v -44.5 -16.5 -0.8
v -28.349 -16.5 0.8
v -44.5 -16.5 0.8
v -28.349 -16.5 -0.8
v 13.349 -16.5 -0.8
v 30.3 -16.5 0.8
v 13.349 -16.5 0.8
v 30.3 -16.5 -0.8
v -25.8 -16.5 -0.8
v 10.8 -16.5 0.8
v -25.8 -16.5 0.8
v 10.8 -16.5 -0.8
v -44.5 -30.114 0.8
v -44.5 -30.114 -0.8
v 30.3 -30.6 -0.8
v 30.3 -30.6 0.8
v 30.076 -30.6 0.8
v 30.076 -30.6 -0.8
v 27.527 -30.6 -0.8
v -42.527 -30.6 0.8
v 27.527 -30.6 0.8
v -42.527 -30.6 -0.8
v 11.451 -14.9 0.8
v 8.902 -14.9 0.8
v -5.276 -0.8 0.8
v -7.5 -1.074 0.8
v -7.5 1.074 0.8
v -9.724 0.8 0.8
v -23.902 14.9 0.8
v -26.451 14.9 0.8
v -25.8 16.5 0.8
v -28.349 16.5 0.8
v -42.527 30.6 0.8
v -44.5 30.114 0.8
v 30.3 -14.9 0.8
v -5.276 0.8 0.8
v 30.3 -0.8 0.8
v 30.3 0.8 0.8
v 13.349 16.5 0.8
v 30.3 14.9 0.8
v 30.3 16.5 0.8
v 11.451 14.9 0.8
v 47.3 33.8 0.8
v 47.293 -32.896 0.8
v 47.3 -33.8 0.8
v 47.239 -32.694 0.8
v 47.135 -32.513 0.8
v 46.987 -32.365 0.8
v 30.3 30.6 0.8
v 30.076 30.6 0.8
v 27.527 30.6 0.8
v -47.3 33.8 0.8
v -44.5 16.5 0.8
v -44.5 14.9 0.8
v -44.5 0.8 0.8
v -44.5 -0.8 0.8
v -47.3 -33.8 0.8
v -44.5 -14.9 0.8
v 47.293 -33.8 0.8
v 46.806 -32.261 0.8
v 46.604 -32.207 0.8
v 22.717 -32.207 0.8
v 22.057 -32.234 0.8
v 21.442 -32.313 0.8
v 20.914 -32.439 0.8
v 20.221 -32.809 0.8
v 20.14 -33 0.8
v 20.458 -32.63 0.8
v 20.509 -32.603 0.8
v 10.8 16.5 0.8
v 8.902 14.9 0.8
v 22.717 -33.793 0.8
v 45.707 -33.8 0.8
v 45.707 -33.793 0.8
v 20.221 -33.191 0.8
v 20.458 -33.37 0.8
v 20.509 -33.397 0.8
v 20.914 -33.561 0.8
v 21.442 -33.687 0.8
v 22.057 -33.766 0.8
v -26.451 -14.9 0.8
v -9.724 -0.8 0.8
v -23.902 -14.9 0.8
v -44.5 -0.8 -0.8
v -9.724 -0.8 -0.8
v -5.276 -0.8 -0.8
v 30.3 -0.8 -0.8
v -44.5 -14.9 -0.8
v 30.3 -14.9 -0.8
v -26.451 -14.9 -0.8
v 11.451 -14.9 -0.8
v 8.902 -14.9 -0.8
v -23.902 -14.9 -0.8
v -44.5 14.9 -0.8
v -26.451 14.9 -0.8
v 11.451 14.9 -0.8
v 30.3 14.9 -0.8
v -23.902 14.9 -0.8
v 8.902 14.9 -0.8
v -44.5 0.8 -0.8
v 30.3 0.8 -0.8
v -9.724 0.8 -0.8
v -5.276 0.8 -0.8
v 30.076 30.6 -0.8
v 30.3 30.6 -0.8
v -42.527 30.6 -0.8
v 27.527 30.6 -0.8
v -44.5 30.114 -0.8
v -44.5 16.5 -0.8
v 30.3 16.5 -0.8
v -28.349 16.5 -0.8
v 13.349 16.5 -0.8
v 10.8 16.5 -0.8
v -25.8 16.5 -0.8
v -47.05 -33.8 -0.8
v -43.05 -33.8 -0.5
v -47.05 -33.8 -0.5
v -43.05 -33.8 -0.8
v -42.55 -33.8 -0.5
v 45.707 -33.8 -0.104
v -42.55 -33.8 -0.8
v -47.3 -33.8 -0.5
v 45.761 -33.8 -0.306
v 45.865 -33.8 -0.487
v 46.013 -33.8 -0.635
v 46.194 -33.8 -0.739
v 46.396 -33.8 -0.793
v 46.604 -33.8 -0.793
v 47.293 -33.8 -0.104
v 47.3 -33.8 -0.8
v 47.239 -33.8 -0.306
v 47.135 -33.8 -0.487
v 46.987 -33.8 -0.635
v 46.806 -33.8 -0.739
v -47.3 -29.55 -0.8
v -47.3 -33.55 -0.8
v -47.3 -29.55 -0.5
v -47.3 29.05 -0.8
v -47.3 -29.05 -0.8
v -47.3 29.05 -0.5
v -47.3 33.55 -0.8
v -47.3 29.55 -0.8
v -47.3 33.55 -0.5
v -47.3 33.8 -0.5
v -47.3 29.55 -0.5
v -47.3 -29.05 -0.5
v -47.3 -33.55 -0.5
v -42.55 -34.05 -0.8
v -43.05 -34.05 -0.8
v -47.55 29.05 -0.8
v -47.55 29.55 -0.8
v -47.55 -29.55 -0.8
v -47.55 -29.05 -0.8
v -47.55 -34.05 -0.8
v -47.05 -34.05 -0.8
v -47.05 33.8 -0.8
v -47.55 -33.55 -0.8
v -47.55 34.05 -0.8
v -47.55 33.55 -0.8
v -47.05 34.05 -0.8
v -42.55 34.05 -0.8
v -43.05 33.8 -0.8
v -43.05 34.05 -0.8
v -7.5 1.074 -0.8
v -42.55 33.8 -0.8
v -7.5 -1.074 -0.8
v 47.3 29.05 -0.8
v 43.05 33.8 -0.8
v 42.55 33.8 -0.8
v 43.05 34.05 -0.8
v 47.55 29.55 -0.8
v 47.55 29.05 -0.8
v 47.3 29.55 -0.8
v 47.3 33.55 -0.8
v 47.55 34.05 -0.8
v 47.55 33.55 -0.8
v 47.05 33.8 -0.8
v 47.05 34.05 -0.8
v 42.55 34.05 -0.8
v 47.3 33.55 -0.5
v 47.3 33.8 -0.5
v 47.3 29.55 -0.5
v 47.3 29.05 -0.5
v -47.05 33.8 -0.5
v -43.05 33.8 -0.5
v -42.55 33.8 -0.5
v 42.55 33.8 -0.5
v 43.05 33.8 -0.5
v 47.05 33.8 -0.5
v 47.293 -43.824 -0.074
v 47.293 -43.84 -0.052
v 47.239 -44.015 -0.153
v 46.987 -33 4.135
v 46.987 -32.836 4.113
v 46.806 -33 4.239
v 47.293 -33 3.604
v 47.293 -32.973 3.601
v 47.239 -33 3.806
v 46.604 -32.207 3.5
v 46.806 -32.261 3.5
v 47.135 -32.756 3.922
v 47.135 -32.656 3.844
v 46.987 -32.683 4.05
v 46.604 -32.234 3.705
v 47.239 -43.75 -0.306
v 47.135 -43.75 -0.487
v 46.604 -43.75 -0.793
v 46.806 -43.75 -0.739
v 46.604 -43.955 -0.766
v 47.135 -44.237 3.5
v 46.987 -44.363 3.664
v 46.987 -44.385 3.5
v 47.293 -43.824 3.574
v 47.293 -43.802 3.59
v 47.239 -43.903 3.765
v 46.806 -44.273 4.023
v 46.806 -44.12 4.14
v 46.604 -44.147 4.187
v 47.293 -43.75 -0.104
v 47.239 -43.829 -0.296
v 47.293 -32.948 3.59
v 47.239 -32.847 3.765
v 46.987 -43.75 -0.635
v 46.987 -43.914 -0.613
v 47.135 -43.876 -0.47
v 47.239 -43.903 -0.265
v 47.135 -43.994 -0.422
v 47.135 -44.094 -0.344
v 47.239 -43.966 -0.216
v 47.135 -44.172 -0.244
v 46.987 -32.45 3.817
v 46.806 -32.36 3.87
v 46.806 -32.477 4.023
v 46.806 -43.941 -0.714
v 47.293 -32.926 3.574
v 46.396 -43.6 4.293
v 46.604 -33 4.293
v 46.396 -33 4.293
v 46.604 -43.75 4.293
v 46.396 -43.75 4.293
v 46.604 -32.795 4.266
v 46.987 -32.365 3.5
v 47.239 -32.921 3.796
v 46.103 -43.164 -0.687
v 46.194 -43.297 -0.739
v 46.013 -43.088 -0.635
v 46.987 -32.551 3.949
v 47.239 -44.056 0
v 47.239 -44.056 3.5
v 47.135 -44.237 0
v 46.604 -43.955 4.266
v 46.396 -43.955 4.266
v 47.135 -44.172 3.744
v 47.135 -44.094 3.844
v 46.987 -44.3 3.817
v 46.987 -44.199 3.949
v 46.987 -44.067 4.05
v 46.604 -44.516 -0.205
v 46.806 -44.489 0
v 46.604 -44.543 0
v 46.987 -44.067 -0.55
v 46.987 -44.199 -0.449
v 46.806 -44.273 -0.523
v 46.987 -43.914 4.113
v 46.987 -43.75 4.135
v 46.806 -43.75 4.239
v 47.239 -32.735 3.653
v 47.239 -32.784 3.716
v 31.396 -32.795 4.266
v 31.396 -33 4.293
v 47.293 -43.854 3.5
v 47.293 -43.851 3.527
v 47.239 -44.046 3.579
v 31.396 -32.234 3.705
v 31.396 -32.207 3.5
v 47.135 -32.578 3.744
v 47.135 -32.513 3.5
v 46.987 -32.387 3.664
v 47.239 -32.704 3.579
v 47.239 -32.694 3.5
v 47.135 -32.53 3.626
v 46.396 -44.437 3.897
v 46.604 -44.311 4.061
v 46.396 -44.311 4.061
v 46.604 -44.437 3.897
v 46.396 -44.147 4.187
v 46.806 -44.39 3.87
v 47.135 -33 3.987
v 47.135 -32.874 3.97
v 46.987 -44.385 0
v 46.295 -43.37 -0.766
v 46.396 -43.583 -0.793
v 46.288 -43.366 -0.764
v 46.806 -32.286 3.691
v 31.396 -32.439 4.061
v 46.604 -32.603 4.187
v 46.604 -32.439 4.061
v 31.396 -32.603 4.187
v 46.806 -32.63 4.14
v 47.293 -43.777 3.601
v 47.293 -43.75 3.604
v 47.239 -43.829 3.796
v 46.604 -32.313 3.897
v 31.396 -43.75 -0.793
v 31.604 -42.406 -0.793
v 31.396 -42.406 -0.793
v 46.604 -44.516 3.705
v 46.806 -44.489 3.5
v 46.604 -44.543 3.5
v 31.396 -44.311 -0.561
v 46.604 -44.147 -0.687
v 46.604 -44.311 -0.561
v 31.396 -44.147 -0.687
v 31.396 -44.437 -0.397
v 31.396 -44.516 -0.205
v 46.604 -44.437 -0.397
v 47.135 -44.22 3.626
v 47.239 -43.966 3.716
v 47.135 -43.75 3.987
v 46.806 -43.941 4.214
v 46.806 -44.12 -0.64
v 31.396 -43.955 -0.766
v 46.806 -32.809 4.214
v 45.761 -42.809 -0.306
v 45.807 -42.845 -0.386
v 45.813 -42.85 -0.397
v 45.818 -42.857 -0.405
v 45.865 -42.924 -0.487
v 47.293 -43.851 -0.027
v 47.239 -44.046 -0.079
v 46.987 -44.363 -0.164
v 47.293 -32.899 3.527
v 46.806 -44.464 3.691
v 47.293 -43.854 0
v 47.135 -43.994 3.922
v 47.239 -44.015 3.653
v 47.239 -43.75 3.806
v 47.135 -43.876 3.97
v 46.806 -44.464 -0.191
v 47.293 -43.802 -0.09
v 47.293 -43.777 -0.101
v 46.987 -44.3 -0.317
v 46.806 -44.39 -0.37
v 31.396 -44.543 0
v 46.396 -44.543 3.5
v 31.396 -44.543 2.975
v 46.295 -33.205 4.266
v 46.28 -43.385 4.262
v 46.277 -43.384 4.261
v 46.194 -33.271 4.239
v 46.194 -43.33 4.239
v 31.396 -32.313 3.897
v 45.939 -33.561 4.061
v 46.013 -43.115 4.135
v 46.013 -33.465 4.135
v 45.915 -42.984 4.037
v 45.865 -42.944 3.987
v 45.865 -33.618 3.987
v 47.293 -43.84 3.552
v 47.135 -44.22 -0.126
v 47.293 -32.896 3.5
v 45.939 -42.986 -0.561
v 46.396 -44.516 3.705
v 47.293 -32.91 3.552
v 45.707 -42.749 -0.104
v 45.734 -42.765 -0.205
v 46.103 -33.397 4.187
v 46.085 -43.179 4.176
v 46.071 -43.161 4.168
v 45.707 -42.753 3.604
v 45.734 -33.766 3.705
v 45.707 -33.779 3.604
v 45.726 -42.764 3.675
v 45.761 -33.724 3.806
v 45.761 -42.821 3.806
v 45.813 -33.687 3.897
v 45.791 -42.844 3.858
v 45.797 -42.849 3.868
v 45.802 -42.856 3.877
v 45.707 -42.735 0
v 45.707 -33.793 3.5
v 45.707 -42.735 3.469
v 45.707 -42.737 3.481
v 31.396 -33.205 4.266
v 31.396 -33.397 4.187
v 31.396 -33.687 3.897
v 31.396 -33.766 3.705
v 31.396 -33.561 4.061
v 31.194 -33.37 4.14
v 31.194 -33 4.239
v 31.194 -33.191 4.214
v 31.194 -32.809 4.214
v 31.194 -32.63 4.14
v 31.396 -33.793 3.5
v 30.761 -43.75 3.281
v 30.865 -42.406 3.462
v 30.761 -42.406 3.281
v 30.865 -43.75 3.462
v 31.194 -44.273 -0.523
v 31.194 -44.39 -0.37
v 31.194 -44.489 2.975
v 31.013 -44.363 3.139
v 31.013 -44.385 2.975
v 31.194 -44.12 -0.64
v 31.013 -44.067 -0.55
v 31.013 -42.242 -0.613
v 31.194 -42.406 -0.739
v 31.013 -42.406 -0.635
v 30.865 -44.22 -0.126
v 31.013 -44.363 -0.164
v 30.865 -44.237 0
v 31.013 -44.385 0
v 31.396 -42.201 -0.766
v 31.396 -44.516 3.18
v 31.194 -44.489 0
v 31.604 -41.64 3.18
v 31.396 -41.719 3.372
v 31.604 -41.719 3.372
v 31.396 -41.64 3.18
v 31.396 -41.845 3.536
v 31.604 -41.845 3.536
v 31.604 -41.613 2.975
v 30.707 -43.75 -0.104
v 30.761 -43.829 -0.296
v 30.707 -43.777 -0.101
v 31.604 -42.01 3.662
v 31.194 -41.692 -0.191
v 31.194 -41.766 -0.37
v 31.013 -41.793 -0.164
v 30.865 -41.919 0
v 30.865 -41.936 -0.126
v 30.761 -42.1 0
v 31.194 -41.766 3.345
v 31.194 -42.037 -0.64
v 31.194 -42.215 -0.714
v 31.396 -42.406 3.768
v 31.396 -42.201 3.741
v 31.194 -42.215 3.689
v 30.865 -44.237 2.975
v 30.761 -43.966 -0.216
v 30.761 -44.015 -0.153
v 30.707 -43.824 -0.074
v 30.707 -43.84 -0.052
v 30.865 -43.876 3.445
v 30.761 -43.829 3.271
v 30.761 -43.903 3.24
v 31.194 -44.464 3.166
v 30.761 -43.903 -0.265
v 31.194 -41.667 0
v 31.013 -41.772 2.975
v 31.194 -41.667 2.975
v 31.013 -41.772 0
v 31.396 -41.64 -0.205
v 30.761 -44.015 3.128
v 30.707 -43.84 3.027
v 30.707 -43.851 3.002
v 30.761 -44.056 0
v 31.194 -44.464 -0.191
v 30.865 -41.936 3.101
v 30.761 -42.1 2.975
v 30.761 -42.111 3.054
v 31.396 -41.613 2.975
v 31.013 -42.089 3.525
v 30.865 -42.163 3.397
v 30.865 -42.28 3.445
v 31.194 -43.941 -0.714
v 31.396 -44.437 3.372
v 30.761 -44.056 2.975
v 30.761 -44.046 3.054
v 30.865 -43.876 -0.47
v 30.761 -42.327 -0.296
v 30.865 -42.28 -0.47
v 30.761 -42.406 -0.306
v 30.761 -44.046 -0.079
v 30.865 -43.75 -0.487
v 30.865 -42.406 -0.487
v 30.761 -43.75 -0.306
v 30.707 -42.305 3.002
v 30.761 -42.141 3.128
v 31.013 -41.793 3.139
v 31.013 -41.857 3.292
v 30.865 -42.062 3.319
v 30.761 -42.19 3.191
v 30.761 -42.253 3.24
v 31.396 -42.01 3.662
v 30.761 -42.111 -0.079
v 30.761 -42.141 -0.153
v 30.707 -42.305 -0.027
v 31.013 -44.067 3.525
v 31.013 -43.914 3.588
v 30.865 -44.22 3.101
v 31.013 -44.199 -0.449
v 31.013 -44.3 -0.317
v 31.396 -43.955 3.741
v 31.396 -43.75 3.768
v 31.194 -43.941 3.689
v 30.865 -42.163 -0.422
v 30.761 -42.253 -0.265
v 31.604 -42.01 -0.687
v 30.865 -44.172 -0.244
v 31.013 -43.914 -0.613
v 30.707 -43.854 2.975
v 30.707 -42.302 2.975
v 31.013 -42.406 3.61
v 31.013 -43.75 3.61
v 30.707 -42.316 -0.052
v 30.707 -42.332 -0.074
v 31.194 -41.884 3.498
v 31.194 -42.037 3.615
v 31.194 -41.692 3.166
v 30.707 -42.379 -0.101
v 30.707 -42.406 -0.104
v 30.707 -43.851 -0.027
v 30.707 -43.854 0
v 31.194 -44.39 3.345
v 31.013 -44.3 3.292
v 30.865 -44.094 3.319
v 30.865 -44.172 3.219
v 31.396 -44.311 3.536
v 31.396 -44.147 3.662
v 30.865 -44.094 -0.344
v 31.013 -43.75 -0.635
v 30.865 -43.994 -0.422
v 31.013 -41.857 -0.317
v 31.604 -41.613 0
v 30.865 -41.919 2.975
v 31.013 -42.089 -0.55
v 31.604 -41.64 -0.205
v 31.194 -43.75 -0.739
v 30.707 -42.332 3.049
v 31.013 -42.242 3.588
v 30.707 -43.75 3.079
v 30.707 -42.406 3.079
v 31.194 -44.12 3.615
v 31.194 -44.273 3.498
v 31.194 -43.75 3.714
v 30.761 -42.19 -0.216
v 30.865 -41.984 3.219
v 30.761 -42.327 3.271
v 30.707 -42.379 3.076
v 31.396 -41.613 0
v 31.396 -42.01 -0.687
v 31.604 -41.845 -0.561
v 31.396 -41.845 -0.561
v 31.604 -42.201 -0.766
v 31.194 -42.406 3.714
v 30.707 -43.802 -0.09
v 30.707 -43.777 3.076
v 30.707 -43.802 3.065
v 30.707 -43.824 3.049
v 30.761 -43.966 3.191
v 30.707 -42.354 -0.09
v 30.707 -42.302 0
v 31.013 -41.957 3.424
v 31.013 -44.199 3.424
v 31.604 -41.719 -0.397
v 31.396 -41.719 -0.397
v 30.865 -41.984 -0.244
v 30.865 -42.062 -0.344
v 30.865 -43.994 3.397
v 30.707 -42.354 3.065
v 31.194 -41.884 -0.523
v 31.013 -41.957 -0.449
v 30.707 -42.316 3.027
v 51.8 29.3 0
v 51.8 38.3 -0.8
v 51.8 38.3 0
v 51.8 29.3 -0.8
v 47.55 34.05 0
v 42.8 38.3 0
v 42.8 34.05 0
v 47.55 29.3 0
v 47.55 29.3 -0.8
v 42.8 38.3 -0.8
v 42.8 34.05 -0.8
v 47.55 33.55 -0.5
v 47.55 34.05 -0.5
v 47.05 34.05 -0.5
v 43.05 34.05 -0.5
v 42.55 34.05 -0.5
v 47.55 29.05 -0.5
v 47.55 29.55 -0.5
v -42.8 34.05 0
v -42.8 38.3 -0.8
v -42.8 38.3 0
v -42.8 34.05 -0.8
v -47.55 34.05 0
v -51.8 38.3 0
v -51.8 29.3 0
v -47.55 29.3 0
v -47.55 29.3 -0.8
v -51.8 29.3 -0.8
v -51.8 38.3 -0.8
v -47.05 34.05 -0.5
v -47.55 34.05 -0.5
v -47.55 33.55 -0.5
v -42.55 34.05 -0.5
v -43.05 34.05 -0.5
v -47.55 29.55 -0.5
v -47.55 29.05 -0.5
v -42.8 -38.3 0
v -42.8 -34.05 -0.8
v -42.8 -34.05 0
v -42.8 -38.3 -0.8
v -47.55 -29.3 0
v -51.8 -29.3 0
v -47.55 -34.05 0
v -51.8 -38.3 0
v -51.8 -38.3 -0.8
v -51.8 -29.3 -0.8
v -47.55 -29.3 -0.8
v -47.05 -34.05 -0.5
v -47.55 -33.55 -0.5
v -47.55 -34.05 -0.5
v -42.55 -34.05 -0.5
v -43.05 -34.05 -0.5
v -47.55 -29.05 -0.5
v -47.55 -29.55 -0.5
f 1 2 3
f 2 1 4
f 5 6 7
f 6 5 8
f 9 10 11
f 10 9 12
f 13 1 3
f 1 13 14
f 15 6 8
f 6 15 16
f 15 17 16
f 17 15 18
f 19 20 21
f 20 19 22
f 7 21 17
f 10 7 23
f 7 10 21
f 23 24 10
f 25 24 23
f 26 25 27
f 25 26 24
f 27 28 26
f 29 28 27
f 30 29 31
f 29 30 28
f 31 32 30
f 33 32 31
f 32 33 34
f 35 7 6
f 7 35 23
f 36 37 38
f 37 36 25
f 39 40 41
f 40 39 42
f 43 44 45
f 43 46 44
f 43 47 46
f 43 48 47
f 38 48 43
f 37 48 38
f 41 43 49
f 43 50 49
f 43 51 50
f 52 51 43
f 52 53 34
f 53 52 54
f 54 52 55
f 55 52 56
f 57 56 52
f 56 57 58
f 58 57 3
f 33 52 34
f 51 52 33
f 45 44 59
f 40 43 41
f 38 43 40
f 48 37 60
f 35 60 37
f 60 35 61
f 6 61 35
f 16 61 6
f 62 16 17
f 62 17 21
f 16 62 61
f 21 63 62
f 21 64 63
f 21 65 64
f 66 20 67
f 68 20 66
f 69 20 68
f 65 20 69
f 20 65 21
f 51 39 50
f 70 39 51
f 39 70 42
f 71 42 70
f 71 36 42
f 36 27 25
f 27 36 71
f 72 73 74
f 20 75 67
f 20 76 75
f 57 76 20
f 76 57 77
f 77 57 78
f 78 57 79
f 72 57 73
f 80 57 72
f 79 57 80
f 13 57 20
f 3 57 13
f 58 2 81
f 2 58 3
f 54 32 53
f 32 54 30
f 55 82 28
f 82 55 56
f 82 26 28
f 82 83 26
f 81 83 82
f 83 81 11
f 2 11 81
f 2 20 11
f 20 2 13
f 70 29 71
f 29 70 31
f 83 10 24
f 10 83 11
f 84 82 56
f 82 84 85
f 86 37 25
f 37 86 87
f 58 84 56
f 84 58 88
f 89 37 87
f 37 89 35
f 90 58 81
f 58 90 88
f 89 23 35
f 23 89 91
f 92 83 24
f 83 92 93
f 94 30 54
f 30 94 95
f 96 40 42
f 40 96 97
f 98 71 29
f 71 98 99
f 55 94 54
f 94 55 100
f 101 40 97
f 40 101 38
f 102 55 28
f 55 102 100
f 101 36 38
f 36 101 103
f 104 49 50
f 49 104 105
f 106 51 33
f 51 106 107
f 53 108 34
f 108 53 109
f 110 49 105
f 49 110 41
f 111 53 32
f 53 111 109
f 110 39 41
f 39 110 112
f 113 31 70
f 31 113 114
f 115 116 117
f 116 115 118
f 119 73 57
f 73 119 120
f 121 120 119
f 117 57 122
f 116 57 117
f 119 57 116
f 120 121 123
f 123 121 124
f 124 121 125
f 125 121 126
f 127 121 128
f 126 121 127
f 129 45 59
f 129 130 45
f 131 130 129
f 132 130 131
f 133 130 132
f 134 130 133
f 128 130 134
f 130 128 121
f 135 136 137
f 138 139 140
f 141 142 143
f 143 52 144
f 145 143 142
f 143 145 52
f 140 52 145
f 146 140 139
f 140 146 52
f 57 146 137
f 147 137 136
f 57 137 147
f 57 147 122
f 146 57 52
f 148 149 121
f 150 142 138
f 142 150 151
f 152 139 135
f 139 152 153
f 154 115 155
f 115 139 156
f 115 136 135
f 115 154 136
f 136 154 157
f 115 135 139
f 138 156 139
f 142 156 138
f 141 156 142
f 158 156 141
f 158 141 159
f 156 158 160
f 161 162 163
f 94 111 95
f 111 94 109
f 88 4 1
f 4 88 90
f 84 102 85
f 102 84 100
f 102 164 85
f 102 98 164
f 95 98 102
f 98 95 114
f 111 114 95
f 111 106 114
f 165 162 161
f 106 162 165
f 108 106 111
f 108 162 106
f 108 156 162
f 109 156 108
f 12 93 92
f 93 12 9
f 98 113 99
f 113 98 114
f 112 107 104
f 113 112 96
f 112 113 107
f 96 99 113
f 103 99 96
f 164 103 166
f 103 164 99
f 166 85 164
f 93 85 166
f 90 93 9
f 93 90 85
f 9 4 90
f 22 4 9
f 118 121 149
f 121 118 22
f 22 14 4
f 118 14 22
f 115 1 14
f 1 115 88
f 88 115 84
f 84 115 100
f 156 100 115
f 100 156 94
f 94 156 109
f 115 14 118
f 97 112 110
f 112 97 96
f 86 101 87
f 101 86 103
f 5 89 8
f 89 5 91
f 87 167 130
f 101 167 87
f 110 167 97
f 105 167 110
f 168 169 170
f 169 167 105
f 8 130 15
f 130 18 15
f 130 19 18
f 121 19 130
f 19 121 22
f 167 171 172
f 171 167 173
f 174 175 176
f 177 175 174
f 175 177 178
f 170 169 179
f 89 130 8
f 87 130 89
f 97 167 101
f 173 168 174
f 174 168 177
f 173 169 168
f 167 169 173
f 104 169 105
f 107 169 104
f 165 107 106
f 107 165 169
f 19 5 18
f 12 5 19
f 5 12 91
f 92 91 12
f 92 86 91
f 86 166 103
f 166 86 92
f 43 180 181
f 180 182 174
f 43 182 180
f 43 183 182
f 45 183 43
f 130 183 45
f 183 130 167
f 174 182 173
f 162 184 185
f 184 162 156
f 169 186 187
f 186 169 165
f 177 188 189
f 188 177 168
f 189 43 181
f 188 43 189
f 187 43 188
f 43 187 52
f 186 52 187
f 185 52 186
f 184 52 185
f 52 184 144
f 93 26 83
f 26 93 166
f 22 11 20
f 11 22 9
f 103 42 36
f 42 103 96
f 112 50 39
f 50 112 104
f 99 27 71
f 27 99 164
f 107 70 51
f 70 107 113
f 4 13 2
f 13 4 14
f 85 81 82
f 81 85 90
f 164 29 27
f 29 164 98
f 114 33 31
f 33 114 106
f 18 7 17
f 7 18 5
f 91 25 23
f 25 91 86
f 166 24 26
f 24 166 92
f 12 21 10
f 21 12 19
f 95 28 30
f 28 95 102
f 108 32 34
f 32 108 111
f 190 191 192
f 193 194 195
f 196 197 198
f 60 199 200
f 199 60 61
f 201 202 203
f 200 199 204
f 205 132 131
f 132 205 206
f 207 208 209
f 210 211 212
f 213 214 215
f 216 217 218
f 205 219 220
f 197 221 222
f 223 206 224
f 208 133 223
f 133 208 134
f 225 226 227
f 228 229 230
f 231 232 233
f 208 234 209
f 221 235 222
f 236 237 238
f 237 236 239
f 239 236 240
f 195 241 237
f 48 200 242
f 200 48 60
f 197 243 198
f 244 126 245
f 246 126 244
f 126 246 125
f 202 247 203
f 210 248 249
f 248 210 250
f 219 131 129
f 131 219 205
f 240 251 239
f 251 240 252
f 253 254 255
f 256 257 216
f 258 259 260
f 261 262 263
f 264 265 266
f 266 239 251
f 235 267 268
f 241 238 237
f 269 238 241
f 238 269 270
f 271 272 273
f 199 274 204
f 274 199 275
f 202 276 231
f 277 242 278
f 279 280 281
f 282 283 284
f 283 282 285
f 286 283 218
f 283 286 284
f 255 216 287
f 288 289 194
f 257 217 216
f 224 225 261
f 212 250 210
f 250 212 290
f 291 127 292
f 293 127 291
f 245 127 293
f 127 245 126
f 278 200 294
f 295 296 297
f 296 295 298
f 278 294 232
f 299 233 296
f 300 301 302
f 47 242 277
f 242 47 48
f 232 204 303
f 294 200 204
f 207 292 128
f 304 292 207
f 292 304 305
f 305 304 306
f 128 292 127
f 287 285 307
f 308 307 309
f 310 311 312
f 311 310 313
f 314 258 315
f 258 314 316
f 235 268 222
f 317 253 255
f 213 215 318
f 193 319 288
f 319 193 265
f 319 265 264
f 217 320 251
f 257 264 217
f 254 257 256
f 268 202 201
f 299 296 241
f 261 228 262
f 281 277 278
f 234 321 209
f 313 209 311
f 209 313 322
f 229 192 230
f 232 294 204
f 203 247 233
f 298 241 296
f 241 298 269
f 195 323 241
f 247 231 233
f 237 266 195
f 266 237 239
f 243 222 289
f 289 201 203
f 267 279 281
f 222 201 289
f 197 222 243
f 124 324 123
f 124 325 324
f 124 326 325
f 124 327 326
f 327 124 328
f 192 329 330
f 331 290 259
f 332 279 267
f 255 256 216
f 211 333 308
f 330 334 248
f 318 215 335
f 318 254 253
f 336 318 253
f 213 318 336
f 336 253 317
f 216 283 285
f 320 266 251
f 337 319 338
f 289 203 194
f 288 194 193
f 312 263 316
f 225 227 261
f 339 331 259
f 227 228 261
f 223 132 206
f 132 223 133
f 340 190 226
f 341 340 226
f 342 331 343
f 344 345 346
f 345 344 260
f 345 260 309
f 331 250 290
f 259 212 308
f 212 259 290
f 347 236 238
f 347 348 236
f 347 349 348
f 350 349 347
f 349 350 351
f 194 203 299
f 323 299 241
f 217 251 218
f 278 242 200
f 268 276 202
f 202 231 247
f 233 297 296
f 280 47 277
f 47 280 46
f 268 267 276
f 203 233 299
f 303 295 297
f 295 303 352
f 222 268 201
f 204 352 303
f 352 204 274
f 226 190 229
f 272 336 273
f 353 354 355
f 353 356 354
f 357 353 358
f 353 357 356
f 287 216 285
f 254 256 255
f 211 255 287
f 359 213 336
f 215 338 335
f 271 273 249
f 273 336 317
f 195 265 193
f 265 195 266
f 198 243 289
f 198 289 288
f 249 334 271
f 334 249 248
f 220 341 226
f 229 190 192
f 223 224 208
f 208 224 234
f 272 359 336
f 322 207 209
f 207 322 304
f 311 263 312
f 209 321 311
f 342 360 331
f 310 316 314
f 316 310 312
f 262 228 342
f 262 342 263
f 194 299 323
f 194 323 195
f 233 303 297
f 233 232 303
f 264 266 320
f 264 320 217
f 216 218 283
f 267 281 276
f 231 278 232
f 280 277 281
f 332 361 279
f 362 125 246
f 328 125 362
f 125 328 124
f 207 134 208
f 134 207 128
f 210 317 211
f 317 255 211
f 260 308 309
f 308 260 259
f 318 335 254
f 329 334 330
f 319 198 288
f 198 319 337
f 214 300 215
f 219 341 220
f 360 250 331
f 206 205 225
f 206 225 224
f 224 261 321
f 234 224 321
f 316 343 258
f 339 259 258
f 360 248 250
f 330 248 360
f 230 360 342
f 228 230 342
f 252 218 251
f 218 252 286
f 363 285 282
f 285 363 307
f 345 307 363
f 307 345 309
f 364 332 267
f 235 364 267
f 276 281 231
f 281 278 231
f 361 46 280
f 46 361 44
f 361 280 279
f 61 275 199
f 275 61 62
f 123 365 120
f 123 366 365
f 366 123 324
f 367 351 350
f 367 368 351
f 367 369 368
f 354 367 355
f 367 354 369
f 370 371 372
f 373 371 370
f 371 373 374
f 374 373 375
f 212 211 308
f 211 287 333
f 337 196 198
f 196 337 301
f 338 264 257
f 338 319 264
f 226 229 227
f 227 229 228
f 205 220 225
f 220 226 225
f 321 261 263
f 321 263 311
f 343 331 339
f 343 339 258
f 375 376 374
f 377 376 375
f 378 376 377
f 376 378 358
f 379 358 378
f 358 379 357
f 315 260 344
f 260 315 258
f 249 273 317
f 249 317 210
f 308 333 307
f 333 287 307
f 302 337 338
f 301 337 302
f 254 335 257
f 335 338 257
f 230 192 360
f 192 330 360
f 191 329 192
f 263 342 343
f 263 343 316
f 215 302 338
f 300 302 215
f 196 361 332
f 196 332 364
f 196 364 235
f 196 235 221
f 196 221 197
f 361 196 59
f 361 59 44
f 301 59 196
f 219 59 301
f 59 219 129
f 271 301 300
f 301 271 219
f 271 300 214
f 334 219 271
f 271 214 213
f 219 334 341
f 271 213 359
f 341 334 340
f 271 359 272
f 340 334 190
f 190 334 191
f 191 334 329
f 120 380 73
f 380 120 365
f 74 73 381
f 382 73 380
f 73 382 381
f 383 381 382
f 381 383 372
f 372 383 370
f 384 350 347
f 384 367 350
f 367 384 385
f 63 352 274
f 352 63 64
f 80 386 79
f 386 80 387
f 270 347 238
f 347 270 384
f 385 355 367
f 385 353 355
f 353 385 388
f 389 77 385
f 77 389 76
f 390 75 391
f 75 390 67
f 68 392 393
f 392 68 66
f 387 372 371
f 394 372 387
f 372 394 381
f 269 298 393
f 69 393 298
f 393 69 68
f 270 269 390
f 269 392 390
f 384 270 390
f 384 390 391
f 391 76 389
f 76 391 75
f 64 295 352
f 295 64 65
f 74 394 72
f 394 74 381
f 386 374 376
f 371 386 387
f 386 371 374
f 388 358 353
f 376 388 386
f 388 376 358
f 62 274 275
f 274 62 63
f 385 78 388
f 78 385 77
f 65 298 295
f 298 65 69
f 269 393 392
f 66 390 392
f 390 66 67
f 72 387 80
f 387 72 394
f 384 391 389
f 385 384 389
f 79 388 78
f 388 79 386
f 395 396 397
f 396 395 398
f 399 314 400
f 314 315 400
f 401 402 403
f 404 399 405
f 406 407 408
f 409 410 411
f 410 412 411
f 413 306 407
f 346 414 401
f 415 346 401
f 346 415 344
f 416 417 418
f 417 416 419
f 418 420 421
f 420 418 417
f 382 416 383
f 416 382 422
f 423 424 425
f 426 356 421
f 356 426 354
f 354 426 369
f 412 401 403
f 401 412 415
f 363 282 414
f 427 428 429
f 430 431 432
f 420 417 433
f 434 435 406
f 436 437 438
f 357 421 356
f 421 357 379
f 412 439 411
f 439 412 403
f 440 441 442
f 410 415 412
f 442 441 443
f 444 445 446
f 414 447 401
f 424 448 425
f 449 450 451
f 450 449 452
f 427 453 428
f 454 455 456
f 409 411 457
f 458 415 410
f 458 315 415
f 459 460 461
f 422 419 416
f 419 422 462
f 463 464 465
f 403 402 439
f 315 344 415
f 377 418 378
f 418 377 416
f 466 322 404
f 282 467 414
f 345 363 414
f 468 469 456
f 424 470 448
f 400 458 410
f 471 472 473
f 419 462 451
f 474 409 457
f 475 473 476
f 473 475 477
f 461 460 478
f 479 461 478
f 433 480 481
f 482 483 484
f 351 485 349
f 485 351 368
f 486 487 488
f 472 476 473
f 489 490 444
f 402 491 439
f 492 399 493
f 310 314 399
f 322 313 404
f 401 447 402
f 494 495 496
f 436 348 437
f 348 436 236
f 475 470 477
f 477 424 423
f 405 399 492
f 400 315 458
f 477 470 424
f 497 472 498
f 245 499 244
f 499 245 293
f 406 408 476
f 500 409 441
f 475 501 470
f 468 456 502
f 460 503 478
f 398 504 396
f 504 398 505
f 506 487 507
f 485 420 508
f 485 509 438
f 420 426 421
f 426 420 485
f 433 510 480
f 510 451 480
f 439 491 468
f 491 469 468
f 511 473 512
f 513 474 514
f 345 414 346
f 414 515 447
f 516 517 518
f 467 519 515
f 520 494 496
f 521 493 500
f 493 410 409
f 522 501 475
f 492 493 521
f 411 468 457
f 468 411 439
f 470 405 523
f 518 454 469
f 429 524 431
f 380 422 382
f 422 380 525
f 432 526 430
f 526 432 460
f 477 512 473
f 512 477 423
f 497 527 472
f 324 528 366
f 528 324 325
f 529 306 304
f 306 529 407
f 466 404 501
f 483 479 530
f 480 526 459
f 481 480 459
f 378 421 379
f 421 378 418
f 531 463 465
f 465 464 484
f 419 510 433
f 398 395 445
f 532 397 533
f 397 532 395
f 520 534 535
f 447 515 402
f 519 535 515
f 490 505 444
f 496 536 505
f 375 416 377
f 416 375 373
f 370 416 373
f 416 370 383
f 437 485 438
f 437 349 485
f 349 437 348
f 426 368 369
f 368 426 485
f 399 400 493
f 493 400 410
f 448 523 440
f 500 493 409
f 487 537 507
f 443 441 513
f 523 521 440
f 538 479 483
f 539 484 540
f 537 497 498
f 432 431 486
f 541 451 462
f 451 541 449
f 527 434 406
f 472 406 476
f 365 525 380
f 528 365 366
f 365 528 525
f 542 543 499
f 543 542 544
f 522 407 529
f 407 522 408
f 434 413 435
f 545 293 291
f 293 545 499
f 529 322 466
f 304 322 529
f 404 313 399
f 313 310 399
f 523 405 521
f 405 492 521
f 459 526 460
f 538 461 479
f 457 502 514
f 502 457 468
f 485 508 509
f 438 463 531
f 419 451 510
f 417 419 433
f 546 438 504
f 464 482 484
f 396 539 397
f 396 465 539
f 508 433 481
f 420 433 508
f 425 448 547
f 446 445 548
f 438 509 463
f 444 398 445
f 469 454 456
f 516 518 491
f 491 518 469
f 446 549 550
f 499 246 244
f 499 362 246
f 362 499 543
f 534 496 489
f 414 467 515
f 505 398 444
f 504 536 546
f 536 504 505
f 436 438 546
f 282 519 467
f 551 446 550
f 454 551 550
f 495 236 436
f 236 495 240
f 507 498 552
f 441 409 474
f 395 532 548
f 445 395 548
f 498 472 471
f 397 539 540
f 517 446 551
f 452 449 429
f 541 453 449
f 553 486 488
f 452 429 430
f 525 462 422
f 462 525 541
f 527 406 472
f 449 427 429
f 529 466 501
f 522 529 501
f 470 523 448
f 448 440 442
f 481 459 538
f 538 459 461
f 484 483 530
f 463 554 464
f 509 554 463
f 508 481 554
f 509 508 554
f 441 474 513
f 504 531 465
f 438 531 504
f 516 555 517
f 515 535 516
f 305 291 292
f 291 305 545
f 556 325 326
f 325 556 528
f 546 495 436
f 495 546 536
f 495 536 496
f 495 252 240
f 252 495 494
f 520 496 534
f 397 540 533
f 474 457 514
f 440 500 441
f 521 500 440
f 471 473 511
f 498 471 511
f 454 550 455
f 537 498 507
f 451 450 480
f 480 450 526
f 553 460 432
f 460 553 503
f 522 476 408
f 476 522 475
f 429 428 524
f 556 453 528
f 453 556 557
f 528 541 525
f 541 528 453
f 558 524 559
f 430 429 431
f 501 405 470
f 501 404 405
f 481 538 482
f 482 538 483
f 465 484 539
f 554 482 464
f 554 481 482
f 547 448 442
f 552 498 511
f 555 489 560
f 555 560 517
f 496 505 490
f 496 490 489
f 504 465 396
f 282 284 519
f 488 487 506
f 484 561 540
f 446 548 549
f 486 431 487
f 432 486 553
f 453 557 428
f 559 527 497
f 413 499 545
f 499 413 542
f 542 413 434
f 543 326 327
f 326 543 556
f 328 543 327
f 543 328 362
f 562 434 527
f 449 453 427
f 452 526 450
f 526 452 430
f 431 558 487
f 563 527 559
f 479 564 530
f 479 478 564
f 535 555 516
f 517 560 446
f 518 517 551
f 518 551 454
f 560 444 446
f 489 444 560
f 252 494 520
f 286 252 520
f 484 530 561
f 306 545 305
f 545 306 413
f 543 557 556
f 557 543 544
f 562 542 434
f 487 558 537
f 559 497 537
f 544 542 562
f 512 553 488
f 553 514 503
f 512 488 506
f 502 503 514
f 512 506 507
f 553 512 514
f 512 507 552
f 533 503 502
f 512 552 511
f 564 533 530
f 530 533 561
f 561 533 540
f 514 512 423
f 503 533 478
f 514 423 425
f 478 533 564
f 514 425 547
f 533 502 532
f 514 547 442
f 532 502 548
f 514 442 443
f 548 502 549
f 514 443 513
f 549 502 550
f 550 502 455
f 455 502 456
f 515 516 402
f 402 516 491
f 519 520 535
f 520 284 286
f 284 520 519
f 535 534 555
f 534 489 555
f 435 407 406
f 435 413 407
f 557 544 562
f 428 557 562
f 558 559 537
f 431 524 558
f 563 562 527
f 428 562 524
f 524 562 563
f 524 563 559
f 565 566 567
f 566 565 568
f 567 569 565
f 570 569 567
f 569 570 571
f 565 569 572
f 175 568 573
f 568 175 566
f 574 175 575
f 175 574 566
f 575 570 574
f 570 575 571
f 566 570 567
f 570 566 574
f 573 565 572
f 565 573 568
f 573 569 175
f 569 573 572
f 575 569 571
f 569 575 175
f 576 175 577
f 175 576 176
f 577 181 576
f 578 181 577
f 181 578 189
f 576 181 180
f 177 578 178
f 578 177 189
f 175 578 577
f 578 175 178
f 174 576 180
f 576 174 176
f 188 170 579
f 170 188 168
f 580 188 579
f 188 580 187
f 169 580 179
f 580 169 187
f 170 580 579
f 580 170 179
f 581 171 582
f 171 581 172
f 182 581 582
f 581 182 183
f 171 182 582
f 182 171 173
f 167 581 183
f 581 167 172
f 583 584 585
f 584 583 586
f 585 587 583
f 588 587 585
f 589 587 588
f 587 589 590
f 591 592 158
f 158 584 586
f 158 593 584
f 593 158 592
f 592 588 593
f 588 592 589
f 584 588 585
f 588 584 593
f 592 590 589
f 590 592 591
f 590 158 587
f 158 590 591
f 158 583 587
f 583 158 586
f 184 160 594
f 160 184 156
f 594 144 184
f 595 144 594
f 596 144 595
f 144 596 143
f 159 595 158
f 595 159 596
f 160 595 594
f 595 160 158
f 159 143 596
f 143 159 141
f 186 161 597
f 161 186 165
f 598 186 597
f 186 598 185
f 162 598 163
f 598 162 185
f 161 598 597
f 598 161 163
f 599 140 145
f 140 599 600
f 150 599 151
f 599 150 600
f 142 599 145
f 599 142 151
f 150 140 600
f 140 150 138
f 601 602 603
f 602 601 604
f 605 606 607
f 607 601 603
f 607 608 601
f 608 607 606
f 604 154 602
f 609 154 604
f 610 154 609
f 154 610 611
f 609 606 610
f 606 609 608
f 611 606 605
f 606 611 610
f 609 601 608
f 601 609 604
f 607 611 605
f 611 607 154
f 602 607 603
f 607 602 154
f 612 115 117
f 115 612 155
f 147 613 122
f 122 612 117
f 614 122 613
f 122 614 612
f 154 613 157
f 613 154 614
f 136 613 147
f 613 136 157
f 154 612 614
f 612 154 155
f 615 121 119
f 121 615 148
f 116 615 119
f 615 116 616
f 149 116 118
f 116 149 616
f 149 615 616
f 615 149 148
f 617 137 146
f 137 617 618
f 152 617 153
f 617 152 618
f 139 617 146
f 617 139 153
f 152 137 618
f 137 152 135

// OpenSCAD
/* 
 * Instructions:
 * 1. Download and install the fonts from here: https://andrewgioia.github.io/Keyrune/index.html & https://andrewgioia.github.io/Mana/index.html
 * 2. Set your front set symbol and your back set symbol by copying the icon from this page: https://andrewgioia.github.io/Keyrune/cheatsheet.html or this page: https://andrewgioia.github.io/Mana/cheatsheet.html. You want the icon, nothing else. If it doesn't look quite right in the string input, that should be ok; the rendering uses the specifc Keyrune font. (if you want, you can use the unicode like \ue93f, but if you don't understand how to do that, just copy and paste the symbol). If you want the same symbol on front and back...paste the same symbol.  If you don't want a symbol on one side, just use an empty string.
 * 3. Set clip_location to false to put the clip on the left side instead. I recommend alternating them.
 */

/* [Divider] */
// Width of the divider. The depth is added to this number.
width = 66;
// Height of the divider. The depth is added to this number.
height = 93;
// Thickness of the divider. Also acts as the diameter of all the rounded edges.
depth = 1.6; // [1.5:0.1:6]
// The number of bars supporting the divider structure. Fairly hollow by default to save material. Setting to about 40 or higher will create a solid divider.
bars = 3; // [0:40]
// Create some feet to help hold the divider in place without supports
addFeet = true;

/* [Clip] */
// if true, adds a clip. If false, there's no clip! No clip is useful if you want to use it in a deckbox or bundle box or something similar.
addClip = true;
// Width of the clip on the side of the divider. This should be slightly bigger than whatever wall you want to clip it to.
clip_width = 10.75;
// Height of the clip on the side of the divider. Higher will make it clip better. Keep it reasonably small though.
clip_height = 15;
// Depth of the clip on the side of the divider. Higher will make it clip better. Keep it reasonably small though.
clip_depth = 3.5;
// Determines which side to place the clip on. Alternating sides every column is recommended. For outer columns, plan on having this face inside. Note that it will always appear on the right in the model for printing purposes, and the text will be reversed, to have the effect of having the clip on the left
clip_location = 1; // [2:Both, 1:Right, 0:Left]
// Number of millimeters to move the clip down the side. Leave at zero for the top of the divider.
clip_vertical_position=0;

/* [Label] */
// Size of how big to make the text. Don't go too big, or it will be blocked by the cards. 
label_size = 10; // [6:24]
// The expansion set symbol for the front of the divider.

// Strongly recommended you use these instead of images.
// The symbol you want on the front side of the divider. Paste this from https://andrewgioia.github.io/Keyrune/cheatsheet.html
front_set = "";
// The symbol you want on the front side of the divider. Paste this from https://andrewgioia.github.io/Mana/cheatsheet.html
front_symbol = "";

// The symbol you want on the back side of the divider. Paste this from https://andrewgioia.github.io/Keyrune/cheatsheet.html
back_set = "";
// The symbol you want on the back side of the divider. Paste this from https://andrewgioia.github.io/Mana/cheatsheet.html
back_symbol = "";

// Variables that make life easier
rad = depth / 2;
rad_w_padding = depth * 3 / 4;
space_size = width / (bars + 1) - depth - 2 * depth / (bars + 1);
font_size = label_size*.9;
footSize = 9;


rotate([0, 0, 90]) {
    difference() {
        translate([-width / 2, -height / 2, 0])rotate([-90, 0, 0])divider();
        addSymbols(front_set, front_symbol);
        rotate([180, 0, 180])addSymbols(back_set, back_symbol);
    }
    if(addClip){
        if(clip_location > 0){
            translate([width / 2, -height / 2, 0])mirror([1, 0, 0])rotate([-90, 0, 0])translate([0, 0, clip_vertical_position])clip();
        } 
        if (clip_location != 1){
            translate([-width / 2, -height / 2, 0])rotate([-90, 0, 0])translate([0, 0, clip_vertical_position])clip();
        }
    }
}
if ( addFeet ) {
    if(!addClip){
        attachFoot(1,1);
        attachFoot(1,-1);
    } else { 
        if(clip_location < 1){
            attachFoot(1,-1);
        } 
        if(clip_location == 1) {
            attachFoot(1,1);
        }
    }
    attachFoot(-1,1);
    attachFoot(-1,-1);
}

module addSymbols(set, symbol) {
    rotate([0, 0, 180]) {
        translate([0, height / 2 - 0.3 * label_size, -rad+0.3]) {
            translate([-width / 3, -label_size / 2, 0]) {
                //print_image(front_set_image);
                linear_extrude(height=depth) {
                    text(set, font="Keyrune", size=font_size, valign="center", halign="center");
                }
            }
            translate([-width / 3 + label_size + label_size / 2 - 1, -label_size / 2, 0]) {
                //print_image( front_symbol_image );
                linear_extrude(height=depth) {
                    text(symbol , font="Mana", size=font_size, valign="center", halign="center");
                }
            }
        }
    }
}

/* Making the divider itself */
module divider() {
    // Make Base Divider
    union(){
        difference() {
            // Start with a rectangle, width x height
            hull() {
                /*  using a flat base instead of rounded corners improves bed adhesion
                corner([0, 0, 0]);
                corner([0, 0, height]);
                corner([width, 0, 0]);
                corner([width, 0, height]);
                */
                translate([-rad, -rad, -rad])cube([width + depth, depth, height + depth]);
            }
            // Add gaps in the main divider to save plastic.
            for(gap=[0:bars]){
                translate([depth + rad + gap * (depth + space_size), -rad, rad_w_padding + 1.5 * label_size]){
                    cube([space_size, depth*2, height - 2 * depth - 1.5 * label_size]);
                }
            }
        }
        // Add 2 cross beams to support the gaps.
        hull(){        
            translate([rad, 0, height - rad])cube([rad, depth, depth], center=true);
            translate([width - rad, 0, rad + 1.5 * label_size])cube([rad, depth, depth], center=true);
        }
        hull(){        
            translate([width - rad, 0, height - rad])cube([rad, depth, depth], center=true);
            translate([rad, 0, rad + 1.5 * label_size])cube([rad, depth, depth], center=true);
        }
    }
}

/* make the clip to attach to the side of the divider */
module clip() {
    // Make Clip Base
    difference(){
        union(){
            hull() {
                corner([width, 0, 0]);
                corner([width, -clip_depth, 0]);
                corner([width + clip_width, 0, 0]);
                corner([width + clip_width, -clip_depth, 0]);
            }
            // Make Clip Side 1
            hull() {
                corner([width, 0, 0]);
                corner([width, -clip_depth, 0]);
                corner([width, -clip_depth, clip_height]);
                corner([width, 0, clip_height * 1.75]);
            }

            // Make Clip Side 2. Make a flat edge with a slightly indented inner edge
            hull() {
                corner([width + clip_width - 0.15, 0, 0]);
                corner([width + clip_width - 0.15, -clip_depth, 0]);
                corner([width + clip_width, 0, 0]);
                corner([width + clip_width, -clip_depth, 0]);
                corner([width + (clip_width * 0.875), 0, clip_height]);
                corner([width + (clip_width * 0.875), -clip_depth * 0.85, clip_height]);
                corner([width + (clip_width), 0 * 0.85, clip_height]);
                corner([width + (clip_width), -clip_depth * 0.85, clip_height]);
            }
        }
        translate([width + clip_width * 2, -clip_depth / 2, clip_height / 2]) {
            rotate([-90,0,90]){
                //print_image(front_set_image);
                linear_extrude(height=clip_width - 0.5) {
                    text(front_set, font="Keyrune", size=clip_depth * 0.75, valign="center", halign="center");
                }
            }
        }
    }
}

/* 
 * Helper to make corners for the rounded edges. Give location as a vector and it will create a sphere with a size of half the depth (the radius). Use hull() to connect them into a shape.
 */
module corner(location) {
    translate(location) {
        union(){
            sphere(rad, $fn=24);
        }
    }
}

/* No longer supported, but it's here if I need it */
module print_image(filename) {
    if (filename != "") {
        scale([0.1, 0.1, rad]) {
            surface(file=filename, center=true, convexity=5);
        }
    }
}

module attachFoot(xMod, yMod) {
    translate([xMod * (height / 2 + 0.0 + rad) - footSize / 2, yMod * (width / 2 + 0.0 + rad) - footSize / 2, -rad])difference(){
        cube([footSize, footSize, rad]);
        translate([-xMod * (footSize / 2 - 0.25), -yMod * (footSize / 2 - 0.25), 0])cube([footSize, footSize, rad]);
    }
    translate([xMod * height / 2 - 0.25 + xMod * rad, yMod * width / 2 - 0.25 + yMod * rad, -rad])footAttachment();
    translate([xMod * height / 2 - 0.25 + xMod * rad - xMod * footSize / 2, yMod * width / 2 - 0.25 + yMod * rad, -rad])footAttachment();
    translate([xMod * height / 2 - 0.25 + xMod * rad, yMod * width / 2 - 0.25 + yMod * rad - yMod * footSize / 2, -rad])footAttachment();
}

module footAttachment() {
    cube([0.5, 0.5, 0.3]);
}
